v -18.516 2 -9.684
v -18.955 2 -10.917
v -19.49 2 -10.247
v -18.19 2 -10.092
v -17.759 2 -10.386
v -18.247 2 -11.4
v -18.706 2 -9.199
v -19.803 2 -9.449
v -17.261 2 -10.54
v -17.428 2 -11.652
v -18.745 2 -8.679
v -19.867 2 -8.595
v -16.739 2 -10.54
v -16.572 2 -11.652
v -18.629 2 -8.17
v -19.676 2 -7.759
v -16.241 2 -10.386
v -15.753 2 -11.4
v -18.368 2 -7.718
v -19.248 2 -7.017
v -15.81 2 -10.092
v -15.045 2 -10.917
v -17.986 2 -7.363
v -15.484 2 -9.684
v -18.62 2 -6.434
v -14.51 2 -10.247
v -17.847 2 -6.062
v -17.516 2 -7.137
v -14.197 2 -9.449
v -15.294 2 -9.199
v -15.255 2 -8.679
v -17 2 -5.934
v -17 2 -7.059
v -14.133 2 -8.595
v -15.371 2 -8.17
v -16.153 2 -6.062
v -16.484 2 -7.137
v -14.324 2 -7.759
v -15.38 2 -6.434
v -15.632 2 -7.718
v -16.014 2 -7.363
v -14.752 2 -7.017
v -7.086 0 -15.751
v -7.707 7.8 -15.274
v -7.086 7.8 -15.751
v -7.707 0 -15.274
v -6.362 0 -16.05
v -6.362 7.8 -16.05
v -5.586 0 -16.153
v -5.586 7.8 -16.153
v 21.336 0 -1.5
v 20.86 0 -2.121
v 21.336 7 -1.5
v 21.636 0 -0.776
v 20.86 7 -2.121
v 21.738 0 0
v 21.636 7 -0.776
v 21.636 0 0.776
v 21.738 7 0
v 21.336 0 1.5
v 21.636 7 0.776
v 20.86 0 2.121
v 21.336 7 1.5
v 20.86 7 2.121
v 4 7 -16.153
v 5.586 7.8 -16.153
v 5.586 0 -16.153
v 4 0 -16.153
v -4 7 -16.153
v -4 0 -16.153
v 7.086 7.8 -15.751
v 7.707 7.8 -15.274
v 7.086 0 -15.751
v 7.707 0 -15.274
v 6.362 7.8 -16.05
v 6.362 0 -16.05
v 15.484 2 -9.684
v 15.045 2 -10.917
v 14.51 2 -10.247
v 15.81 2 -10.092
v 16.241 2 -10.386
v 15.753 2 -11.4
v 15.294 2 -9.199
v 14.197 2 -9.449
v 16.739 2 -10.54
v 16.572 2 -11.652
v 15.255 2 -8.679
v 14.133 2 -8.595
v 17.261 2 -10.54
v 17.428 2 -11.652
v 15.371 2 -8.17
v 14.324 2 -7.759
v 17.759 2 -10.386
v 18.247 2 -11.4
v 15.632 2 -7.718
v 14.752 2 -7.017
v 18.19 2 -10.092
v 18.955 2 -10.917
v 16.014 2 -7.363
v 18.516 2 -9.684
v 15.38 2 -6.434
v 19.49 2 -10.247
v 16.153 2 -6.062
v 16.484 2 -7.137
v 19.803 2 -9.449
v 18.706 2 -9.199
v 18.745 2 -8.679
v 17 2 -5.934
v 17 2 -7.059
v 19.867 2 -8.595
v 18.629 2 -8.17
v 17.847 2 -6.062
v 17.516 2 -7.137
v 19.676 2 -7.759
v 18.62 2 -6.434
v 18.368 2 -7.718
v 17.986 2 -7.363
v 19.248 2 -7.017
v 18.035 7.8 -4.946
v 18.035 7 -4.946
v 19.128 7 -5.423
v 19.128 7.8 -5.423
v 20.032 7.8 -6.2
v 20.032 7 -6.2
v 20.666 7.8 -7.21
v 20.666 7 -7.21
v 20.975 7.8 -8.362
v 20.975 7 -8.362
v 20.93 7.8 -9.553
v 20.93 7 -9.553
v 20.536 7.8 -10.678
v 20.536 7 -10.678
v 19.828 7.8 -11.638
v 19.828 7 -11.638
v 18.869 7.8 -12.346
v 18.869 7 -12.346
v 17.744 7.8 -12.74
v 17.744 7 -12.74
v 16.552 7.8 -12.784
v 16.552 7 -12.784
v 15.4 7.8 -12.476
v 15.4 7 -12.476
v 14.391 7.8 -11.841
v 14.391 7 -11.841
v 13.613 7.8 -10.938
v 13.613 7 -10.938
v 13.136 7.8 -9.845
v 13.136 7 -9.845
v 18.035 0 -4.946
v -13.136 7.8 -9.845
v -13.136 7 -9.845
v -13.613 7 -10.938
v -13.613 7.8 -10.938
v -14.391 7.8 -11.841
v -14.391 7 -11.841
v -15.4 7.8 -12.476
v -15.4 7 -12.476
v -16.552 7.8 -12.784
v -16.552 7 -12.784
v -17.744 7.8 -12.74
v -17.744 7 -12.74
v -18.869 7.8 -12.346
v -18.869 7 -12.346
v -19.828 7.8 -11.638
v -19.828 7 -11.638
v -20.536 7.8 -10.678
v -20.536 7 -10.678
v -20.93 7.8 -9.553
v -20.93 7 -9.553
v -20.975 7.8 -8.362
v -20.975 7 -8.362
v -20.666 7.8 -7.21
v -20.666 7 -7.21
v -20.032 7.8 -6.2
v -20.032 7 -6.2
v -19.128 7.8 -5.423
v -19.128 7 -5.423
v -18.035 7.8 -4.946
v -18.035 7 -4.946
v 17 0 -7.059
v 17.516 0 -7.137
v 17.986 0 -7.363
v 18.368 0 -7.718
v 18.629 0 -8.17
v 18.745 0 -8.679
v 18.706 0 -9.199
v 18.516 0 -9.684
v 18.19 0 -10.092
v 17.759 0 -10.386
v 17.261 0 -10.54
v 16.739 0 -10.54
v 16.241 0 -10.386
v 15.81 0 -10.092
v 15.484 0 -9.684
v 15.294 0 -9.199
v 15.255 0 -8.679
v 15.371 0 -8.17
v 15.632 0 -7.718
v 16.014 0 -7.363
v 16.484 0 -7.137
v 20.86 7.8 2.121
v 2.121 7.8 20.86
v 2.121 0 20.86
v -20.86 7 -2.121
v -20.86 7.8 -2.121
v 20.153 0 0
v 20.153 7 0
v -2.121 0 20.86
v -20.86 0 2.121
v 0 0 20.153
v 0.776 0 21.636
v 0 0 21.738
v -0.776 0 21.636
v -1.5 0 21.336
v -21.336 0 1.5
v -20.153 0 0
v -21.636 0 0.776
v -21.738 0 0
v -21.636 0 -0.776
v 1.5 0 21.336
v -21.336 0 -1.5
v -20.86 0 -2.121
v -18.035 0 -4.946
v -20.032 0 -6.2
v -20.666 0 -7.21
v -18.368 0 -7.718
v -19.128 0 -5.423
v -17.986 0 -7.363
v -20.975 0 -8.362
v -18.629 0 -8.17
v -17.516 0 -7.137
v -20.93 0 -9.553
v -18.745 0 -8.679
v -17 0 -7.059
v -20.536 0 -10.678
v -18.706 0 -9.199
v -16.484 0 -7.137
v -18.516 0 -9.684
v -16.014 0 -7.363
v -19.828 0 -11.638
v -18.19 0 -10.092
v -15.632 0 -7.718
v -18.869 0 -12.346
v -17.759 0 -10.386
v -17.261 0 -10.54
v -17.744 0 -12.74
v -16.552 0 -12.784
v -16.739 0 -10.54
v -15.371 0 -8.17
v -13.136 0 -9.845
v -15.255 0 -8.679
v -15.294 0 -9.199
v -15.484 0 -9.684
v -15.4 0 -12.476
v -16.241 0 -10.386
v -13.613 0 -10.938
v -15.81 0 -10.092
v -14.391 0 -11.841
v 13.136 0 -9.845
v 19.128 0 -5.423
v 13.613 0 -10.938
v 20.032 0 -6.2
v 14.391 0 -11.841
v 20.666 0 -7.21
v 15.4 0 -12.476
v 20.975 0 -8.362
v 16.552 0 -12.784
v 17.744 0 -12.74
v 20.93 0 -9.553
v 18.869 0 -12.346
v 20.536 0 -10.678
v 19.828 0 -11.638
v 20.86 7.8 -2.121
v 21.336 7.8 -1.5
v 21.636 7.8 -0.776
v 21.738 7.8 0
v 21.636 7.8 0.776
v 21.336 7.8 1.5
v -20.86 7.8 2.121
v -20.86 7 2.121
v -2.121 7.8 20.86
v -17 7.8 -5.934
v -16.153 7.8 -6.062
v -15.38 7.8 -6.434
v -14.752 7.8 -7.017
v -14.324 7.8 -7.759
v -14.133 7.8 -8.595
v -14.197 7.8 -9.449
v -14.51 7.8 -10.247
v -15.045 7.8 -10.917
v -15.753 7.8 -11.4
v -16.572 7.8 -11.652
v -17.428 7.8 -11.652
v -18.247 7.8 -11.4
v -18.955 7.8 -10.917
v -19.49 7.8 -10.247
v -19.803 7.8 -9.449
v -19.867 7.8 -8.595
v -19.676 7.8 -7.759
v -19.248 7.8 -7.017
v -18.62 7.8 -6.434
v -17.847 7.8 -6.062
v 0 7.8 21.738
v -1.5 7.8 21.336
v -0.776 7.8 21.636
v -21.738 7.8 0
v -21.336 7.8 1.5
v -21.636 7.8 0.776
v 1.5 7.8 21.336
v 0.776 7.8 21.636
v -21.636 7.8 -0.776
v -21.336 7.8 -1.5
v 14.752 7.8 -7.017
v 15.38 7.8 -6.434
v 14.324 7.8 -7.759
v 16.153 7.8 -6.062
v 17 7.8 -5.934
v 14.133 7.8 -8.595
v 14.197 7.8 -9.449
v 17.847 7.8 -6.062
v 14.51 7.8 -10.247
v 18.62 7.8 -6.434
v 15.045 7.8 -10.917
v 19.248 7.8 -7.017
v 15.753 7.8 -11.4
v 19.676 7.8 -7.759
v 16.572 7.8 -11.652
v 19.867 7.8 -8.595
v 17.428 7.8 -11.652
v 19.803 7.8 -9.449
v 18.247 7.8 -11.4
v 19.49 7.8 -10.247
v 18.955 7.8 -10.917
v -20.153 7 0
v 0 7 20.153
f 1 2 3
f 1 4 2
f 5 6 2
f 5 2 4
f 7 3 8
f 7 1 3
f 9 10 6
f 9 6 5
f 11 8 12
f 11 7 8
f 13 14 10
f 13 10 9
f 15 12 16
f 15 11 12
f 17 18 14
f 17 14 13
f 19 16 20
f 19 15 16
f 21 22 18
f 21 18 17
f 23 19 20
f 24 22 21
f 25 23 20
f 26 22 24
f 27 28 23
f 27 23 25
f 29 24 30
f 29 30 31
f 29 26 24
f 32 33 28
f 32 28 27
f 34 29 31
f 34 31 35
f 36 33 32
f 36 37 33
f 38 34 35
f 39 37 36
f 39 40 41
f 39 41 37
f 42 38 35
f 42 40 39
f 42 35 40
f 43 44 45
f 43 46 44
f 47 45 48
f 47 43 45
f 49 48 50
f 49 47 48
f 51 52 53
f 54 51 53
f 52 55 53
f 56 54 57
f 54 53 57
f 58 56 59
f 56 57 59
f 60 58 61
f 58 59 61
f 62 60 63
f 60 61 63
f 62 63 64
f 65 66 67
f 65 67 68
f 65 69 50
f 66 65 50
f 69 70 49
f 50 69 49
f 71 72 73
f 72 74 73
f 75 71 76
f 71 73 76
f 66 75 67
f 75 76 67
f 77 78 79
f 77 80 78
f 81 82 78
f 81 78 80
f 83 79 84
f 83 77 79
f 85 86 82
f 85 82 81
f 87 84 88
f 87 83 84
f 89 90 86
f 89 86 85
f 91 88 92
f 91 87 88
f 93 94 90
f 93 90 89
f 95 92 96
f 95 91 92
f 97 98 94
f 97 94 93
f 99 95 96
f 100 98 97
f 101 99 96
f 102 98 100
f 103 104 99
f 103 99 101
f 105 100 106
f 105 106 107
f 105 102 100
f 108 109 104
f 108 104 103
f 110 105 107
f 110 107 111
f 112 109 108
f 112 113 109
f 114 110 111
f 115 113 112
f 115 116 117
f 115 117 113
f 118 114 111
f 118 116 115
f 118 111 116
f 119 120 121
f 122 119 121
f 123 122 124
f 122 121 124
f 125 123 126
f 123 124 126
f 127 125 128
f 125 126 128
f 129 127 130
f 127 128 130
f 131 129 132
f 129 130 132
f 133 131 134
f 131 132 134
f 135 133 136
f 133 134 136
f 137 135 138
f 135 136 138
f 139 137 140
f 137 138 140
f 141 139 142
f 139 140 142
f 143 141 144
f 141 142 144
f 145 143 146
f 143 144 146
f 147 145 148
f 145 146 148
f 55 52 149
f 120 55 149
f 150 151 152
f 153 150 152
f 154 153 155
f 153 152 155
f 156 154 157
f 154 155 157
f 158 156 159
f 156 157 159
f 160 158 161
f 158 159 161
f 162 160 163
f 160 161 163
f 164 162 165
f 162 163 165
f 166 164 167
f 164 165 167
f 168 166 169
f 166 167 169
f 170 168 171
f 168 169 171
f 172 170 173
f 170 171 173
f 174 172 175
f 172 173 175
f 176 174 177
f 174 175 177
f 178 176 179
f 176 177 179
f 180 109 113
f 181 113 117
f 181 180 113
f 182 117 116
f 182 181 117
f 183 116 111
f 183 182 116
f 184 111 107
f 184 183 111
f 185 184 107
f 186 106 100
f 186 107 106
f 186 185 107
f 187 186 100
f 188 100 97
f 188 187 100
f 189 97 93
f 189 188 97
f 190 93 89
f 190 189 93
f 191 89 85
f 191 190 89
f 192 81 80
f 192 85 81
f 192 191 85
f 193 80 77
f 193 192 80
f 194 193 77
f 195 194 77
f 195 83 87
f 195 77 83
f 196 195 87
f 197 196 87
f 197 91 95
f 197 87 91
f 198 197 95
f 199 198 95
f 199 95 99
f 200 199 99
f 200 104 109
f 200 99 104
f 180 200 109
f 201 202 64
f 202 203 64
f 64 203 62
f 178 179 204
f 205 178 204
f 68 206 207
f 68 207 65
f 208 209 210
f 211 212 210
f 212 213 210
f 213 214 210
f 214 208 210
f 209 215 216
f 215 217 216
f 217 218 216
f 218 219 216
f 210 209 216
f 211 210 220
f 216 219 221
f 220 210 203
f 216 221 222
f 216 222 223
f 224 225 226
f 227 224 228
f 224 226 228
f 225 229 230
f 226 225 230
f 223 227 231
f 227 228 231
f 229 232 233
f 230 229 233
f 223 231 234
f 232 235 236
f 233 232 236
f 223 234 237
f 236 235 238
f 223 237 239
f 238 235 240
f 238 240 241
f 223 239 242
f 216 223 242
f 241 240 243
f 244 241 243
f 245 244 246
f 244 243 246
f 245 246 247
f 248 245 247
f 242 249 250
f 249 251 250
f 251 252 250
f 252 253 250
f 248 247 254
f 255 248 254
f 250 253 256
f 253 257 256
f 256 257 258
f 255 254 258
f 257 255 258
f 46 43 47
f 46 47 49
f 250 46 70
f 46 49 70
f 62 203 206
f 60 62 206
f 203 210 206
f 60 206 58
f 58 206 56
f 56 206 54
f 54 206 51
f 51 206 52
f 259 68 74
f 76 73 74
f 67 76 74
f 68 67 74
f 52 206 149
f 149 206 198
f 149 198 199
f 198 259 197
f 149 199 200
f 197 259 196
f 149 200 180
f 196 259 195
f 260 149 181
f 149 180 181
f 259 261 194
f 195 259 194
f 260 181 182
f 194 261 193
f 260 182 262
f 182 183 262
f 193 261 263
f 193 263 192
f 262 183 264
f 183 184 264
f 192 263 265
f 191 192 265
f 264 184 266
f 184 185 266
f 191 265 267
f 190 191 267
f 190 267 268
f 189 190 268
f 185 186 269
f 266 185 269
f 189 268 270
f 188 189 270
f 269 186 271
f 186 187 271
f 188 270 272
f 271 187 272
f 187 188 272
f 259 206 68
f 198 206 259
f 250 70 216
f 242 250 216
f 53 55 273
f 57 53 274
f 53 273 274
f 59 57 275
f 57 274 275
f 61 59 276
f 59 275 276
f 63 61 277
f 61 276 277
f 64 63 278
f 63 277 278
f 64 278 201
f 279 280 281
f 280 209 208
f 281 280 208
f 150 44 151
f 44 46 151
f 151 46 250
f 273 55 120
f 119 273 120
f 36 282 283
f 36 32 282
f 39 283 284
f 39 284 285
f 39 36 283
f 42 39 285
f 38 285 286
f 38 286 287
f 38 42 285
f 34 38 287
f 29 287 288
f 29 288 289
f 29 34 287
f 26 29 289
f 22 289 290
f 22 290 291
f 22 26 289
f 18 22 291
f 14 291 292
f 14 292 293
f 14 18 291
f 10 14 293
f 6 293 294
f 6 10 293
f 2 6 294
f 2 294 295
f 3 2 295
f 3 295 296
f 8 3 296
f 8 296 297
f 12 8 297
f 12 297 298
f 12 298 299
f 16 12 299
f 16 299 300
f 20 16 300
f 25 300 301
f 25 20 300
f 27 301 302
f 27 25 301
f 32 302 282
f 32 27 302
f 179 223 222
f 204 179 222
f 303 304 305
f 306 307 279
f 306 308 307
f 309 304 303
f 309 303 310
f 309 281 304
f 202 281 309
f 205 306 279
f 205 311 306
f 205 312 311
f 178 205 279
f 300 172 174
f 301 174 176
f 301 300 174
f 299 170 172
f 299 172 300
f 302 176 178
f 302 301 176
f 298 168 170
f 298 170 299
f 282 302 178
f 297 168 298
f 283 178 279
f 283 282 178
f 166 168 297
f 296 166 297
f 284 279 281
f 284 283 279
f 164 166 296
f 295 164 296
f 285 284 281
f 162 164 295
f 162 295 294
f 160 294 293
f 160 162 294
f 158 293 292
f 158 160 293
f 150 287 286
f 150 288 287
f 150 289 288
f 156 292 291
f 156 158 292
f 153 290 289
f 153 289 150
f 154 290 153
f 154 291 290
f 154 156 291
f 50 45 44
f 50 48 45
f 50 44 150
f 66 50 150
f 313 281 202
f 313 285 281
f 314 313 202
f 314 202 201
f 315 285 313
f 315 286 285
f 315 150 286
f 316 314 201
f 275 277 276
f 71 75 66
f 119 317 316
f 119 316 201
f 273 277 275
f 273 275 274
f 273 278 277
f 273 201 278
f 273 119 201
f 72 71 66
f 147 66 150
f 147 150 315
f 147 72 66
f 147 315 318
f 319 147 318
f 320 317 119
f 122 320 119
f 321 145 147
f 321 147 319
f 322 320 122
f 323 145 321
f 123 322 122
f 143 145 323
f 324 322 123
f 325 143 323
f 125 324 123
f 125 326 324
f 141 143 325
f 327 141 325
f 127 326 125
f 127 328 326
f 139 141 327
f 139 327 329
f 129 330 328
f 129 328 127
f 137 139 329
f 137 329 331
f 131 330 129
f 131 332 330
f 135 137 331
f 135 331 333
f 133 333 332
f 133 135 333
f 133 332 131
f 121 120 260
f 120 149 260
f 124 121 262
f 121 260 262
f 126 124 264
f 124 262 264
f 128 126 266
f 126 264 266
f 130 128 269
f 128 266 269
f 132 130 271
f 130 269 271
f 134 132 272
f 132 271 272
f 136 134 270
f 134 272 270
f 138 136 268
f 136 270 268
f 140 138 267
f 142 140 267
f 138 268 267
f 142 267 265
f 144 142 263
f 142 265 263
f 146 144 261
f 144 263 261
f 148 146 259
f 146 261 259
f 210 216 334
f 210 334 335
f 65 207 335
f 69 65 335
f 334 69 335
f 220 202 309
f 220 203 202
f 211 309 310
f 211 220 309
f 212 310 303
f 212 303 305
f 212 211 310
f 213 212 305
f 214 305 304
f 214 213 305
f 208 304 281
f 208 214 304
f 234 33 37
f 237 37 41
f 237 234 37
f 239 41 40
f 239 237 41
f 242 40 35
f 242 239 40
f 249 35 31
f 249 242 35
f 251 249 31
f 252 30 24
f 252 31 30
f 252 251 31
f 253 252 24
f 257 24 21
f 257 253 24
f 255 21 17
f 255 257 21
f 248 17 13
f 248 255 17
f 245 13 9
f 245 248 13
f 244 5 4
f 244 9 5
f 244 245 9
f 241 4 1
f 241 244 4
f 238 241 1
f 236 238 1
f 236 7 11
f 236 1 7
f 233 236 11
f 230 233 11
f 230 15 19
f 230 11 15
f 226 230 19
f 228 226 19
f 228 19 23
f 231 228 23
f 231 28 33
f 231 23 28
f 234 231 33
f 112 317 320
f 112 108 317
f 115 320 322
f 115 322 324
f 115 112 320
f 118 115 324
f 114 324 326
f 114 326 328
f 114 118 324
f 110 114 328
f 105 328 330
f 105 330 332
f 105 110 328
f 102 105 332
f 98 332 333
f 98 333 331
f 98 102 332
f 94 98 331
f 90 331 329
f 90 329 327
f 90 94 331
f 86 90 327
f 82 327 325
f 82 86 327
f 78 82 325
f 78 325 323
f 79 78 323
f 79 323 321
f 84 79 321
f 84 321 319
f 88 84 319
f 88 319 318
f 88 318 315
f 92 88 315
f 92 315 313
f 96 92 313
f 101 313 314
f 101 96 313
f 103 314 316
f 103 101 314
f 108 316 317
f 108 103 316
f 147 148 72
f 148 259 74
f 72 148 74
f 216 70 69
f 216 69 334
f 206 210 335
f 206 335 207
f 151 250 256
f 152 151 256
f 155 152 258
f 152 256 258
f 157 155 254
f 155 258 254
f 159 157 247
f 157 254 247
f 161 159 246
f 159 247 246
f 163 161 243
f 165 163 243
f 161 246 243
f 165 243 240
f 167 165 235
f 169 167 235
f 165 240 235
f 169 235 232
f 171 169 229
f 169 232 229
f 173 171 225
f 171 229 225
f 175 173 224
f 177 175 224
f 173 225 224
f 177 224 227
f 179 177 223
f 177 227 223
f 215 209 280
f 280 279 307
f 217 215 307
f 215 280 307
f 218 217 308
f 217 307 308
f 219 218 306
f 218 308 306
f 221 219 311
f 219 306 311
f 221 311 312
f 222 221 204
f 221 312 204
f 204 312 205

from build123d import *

# Parameters (mm, degrees)
SKETCH1_R           = 4
SKETCH1_R_2         = 1.75
BOSS_EXTRUDE1_DEPTH = 7
SKETCH2_R           = 2.875
CUT_EXTRUDE1_DEPTH  = 5
CUT_EXTRUDE3_REACH  = 35.245
SKETCH4_W           = 13.65685425
SKETCH4_H           = 6.828427125
SKETCH5_R           = 2.875
BOSS_EXTRUDE2_DEPTH = 0.8
FILLET1_R           = 3


with BuildPart() as part:
    # Sketch1 → Boss-Extrude1 (new body)
    # profile 1 of 3: a face of its own
    with BuildSketch(Plane(origin=(0, 0, 0), x_dir=(1, 0, 0), z_dir=(0, 1, 0))):
        with Locations((-17, 8.809397513)):
            Circle(SKETCH1_R)
        with Locations(Location((-17, 8.809397513, 0), (0, 0, 270))):
            Circle(SKETCH1_R_2, mode=Mode.SUBTRACT)
    # profile 2 of 3: a face of its own
    with BuildSketch(Plane(origin=(0, 0, 0), x_dir=(1, 0, 0), z_dir=(0, 1, 0))):
        with Locations((17, 8.809397513)):
            Circle(SKETCH1_R)
        with Locations(Location((17, 8.809397513, 0), (0, 0, 270))):
            Circle(SKETCH1_R_2, mode=Mode.SUBTRACT)
    # profile 3 of 3: a face of its own
    with BuildSketch(Plane(origin=(0, 0, 0), x_dir=(1, 0, 0), z_dir=(0, 1, 0))):
        Polygon((-22.980970389, 0), (0, -22.980970389), (22.980970389, 0), (0, 22.980970389), align=None)
        Polygon((-20.152543264, 0), (0, -20.152543264), (20.152543264, 0), (0, 20.152543264), align=None, mode=Mode.SUBTRACT)
    extrude(amount=BOSS_EXTRUDE1_DEPTH)

    # Sketch2 → Cut-Extrude1 (cut)
    with BuildSketch(Plane(origin=(0, 7, 0), x_dir=(1, 0, 0), z_dir=(0, 1, 0))):
        with Locations(Location((-17, 8.809397513, 0), (0, 0, 270))):
            Circle(SKETCH2_R)
        with Locations(Location((17, 8.809397513, 0), (0, 0, 270))):
            Circle(SKETCH2_R)
    extrude(amount=-CUT_EXTRUDE1_DEPTH, mode=Mode.SUBTRACT)

    # Sketch4 → Cut-Extrude3 (cut, up to next)
    with BuildSketch(Plane(origin=(0, 7, 0), x_dir=(1, 0, 0), z_dir=(0, 1, 0)), mode=Mode.PRIVATE) as cut_extrude3_sk1:
        with Locations((0, 19.566756827)):
            Rectangle(SKETCH4_W, SKETCH4_H)
    cut_extrude3_tool1 = extrude(cut_extrude3_sk1.sketch, amount=-CUT_EXTRUDE3_REACH, mode=Mode.PRIVATE) & part.part
    add(cut_extrude3_tool1.solids().sort_by_distance((0, 7, -19.566757))[0], mode=Mode.SUBTRACT)

    # Sketch5 → Boss-Extrude2 (add)
    # profile 1 of 2: a face of its own
    with BuildSketch(Plane(origin=(0, 7, 0), x_dir=(1, 0, 0), z_dir=(0, 1, 0))):
        with BuildLine():
            Line((13.136296695, 9.844673694), (6.828427125, 16.152543264))
            Line((6.828427125, 16.152543264), (4, 16.152543264))
            Line((4, 16.152543264), (20.152543264, 0))
            Line((20.152543264, 0), (0, -20.152543264))
            Line((0, -20.152543264), (-20.152543264, 0))
            Line((-20.152543264, 0), (-4, 16.152543264))
            Line((-4, 16.152543264), (-6.828427125, 16.152543264))
            Line((-6.828427125, 16.152543264), (-13.136296695, 9.844673694))
            ThreePointArc((-13.136296695, 9.844673694), (-19.828427125, 11.637824638), (-18.03527618, 4.945694208))
            Line((-18.03527618, 4.945694208), (-22.980970389, 0))
            Line((-22.980970389, 0), (0, -22.980970389))
            Line((0, -22.980970389), (22.980970389, 0))
            Line((22.980970389, 0), (18.03527618, 4.945694208))
            ThreePointArc((18.03527618, 4.945694208), (19.828427125, 11.637824638), (13.136296695, 9.844673694))
        make_face()
        with Locations(Location((17, 8.809397513, 0), (0, 0, 270))):
            Circle(SKETCH5_R, mode=Mode.SUBTRACT)
        with Locations(Location((-17, 8.809397513, 0), (0, 0, 270))):
            Circle(SKETCH5_R, mode=Mode.SUBTRACT)
    # profile 2 of 2: a face of its own
    with BuildSketch(Plane(origin=(0, 7, 0), x_dir=(1, 0, 0), z_dir=(0, 1, 0))):
        Polygon((-4, 16.152543264), (4, 16.152543264), (20.152543264, 0), (0, -20.152543264), (-20.152543264, 0), align=None)
    extrude(amount=BOSS_EXTRUDE2_DEPTH)

    # Fillet1
    fillet1_edges = [part.edges().sort_by_distance(p)[0] for p in [
        (22.980970389, 3.9, 0),
        (0, 3.9, 22.980970389),
        (-22.980970389, 3.9, 0),
        (6.828427125, 3.9, -16.152543264),
        (-6.828427125, 3.9, -16.152543264),
    ]]
    fillet(fillet1_edges, radius=FILLET1_R)


solid = part.part
